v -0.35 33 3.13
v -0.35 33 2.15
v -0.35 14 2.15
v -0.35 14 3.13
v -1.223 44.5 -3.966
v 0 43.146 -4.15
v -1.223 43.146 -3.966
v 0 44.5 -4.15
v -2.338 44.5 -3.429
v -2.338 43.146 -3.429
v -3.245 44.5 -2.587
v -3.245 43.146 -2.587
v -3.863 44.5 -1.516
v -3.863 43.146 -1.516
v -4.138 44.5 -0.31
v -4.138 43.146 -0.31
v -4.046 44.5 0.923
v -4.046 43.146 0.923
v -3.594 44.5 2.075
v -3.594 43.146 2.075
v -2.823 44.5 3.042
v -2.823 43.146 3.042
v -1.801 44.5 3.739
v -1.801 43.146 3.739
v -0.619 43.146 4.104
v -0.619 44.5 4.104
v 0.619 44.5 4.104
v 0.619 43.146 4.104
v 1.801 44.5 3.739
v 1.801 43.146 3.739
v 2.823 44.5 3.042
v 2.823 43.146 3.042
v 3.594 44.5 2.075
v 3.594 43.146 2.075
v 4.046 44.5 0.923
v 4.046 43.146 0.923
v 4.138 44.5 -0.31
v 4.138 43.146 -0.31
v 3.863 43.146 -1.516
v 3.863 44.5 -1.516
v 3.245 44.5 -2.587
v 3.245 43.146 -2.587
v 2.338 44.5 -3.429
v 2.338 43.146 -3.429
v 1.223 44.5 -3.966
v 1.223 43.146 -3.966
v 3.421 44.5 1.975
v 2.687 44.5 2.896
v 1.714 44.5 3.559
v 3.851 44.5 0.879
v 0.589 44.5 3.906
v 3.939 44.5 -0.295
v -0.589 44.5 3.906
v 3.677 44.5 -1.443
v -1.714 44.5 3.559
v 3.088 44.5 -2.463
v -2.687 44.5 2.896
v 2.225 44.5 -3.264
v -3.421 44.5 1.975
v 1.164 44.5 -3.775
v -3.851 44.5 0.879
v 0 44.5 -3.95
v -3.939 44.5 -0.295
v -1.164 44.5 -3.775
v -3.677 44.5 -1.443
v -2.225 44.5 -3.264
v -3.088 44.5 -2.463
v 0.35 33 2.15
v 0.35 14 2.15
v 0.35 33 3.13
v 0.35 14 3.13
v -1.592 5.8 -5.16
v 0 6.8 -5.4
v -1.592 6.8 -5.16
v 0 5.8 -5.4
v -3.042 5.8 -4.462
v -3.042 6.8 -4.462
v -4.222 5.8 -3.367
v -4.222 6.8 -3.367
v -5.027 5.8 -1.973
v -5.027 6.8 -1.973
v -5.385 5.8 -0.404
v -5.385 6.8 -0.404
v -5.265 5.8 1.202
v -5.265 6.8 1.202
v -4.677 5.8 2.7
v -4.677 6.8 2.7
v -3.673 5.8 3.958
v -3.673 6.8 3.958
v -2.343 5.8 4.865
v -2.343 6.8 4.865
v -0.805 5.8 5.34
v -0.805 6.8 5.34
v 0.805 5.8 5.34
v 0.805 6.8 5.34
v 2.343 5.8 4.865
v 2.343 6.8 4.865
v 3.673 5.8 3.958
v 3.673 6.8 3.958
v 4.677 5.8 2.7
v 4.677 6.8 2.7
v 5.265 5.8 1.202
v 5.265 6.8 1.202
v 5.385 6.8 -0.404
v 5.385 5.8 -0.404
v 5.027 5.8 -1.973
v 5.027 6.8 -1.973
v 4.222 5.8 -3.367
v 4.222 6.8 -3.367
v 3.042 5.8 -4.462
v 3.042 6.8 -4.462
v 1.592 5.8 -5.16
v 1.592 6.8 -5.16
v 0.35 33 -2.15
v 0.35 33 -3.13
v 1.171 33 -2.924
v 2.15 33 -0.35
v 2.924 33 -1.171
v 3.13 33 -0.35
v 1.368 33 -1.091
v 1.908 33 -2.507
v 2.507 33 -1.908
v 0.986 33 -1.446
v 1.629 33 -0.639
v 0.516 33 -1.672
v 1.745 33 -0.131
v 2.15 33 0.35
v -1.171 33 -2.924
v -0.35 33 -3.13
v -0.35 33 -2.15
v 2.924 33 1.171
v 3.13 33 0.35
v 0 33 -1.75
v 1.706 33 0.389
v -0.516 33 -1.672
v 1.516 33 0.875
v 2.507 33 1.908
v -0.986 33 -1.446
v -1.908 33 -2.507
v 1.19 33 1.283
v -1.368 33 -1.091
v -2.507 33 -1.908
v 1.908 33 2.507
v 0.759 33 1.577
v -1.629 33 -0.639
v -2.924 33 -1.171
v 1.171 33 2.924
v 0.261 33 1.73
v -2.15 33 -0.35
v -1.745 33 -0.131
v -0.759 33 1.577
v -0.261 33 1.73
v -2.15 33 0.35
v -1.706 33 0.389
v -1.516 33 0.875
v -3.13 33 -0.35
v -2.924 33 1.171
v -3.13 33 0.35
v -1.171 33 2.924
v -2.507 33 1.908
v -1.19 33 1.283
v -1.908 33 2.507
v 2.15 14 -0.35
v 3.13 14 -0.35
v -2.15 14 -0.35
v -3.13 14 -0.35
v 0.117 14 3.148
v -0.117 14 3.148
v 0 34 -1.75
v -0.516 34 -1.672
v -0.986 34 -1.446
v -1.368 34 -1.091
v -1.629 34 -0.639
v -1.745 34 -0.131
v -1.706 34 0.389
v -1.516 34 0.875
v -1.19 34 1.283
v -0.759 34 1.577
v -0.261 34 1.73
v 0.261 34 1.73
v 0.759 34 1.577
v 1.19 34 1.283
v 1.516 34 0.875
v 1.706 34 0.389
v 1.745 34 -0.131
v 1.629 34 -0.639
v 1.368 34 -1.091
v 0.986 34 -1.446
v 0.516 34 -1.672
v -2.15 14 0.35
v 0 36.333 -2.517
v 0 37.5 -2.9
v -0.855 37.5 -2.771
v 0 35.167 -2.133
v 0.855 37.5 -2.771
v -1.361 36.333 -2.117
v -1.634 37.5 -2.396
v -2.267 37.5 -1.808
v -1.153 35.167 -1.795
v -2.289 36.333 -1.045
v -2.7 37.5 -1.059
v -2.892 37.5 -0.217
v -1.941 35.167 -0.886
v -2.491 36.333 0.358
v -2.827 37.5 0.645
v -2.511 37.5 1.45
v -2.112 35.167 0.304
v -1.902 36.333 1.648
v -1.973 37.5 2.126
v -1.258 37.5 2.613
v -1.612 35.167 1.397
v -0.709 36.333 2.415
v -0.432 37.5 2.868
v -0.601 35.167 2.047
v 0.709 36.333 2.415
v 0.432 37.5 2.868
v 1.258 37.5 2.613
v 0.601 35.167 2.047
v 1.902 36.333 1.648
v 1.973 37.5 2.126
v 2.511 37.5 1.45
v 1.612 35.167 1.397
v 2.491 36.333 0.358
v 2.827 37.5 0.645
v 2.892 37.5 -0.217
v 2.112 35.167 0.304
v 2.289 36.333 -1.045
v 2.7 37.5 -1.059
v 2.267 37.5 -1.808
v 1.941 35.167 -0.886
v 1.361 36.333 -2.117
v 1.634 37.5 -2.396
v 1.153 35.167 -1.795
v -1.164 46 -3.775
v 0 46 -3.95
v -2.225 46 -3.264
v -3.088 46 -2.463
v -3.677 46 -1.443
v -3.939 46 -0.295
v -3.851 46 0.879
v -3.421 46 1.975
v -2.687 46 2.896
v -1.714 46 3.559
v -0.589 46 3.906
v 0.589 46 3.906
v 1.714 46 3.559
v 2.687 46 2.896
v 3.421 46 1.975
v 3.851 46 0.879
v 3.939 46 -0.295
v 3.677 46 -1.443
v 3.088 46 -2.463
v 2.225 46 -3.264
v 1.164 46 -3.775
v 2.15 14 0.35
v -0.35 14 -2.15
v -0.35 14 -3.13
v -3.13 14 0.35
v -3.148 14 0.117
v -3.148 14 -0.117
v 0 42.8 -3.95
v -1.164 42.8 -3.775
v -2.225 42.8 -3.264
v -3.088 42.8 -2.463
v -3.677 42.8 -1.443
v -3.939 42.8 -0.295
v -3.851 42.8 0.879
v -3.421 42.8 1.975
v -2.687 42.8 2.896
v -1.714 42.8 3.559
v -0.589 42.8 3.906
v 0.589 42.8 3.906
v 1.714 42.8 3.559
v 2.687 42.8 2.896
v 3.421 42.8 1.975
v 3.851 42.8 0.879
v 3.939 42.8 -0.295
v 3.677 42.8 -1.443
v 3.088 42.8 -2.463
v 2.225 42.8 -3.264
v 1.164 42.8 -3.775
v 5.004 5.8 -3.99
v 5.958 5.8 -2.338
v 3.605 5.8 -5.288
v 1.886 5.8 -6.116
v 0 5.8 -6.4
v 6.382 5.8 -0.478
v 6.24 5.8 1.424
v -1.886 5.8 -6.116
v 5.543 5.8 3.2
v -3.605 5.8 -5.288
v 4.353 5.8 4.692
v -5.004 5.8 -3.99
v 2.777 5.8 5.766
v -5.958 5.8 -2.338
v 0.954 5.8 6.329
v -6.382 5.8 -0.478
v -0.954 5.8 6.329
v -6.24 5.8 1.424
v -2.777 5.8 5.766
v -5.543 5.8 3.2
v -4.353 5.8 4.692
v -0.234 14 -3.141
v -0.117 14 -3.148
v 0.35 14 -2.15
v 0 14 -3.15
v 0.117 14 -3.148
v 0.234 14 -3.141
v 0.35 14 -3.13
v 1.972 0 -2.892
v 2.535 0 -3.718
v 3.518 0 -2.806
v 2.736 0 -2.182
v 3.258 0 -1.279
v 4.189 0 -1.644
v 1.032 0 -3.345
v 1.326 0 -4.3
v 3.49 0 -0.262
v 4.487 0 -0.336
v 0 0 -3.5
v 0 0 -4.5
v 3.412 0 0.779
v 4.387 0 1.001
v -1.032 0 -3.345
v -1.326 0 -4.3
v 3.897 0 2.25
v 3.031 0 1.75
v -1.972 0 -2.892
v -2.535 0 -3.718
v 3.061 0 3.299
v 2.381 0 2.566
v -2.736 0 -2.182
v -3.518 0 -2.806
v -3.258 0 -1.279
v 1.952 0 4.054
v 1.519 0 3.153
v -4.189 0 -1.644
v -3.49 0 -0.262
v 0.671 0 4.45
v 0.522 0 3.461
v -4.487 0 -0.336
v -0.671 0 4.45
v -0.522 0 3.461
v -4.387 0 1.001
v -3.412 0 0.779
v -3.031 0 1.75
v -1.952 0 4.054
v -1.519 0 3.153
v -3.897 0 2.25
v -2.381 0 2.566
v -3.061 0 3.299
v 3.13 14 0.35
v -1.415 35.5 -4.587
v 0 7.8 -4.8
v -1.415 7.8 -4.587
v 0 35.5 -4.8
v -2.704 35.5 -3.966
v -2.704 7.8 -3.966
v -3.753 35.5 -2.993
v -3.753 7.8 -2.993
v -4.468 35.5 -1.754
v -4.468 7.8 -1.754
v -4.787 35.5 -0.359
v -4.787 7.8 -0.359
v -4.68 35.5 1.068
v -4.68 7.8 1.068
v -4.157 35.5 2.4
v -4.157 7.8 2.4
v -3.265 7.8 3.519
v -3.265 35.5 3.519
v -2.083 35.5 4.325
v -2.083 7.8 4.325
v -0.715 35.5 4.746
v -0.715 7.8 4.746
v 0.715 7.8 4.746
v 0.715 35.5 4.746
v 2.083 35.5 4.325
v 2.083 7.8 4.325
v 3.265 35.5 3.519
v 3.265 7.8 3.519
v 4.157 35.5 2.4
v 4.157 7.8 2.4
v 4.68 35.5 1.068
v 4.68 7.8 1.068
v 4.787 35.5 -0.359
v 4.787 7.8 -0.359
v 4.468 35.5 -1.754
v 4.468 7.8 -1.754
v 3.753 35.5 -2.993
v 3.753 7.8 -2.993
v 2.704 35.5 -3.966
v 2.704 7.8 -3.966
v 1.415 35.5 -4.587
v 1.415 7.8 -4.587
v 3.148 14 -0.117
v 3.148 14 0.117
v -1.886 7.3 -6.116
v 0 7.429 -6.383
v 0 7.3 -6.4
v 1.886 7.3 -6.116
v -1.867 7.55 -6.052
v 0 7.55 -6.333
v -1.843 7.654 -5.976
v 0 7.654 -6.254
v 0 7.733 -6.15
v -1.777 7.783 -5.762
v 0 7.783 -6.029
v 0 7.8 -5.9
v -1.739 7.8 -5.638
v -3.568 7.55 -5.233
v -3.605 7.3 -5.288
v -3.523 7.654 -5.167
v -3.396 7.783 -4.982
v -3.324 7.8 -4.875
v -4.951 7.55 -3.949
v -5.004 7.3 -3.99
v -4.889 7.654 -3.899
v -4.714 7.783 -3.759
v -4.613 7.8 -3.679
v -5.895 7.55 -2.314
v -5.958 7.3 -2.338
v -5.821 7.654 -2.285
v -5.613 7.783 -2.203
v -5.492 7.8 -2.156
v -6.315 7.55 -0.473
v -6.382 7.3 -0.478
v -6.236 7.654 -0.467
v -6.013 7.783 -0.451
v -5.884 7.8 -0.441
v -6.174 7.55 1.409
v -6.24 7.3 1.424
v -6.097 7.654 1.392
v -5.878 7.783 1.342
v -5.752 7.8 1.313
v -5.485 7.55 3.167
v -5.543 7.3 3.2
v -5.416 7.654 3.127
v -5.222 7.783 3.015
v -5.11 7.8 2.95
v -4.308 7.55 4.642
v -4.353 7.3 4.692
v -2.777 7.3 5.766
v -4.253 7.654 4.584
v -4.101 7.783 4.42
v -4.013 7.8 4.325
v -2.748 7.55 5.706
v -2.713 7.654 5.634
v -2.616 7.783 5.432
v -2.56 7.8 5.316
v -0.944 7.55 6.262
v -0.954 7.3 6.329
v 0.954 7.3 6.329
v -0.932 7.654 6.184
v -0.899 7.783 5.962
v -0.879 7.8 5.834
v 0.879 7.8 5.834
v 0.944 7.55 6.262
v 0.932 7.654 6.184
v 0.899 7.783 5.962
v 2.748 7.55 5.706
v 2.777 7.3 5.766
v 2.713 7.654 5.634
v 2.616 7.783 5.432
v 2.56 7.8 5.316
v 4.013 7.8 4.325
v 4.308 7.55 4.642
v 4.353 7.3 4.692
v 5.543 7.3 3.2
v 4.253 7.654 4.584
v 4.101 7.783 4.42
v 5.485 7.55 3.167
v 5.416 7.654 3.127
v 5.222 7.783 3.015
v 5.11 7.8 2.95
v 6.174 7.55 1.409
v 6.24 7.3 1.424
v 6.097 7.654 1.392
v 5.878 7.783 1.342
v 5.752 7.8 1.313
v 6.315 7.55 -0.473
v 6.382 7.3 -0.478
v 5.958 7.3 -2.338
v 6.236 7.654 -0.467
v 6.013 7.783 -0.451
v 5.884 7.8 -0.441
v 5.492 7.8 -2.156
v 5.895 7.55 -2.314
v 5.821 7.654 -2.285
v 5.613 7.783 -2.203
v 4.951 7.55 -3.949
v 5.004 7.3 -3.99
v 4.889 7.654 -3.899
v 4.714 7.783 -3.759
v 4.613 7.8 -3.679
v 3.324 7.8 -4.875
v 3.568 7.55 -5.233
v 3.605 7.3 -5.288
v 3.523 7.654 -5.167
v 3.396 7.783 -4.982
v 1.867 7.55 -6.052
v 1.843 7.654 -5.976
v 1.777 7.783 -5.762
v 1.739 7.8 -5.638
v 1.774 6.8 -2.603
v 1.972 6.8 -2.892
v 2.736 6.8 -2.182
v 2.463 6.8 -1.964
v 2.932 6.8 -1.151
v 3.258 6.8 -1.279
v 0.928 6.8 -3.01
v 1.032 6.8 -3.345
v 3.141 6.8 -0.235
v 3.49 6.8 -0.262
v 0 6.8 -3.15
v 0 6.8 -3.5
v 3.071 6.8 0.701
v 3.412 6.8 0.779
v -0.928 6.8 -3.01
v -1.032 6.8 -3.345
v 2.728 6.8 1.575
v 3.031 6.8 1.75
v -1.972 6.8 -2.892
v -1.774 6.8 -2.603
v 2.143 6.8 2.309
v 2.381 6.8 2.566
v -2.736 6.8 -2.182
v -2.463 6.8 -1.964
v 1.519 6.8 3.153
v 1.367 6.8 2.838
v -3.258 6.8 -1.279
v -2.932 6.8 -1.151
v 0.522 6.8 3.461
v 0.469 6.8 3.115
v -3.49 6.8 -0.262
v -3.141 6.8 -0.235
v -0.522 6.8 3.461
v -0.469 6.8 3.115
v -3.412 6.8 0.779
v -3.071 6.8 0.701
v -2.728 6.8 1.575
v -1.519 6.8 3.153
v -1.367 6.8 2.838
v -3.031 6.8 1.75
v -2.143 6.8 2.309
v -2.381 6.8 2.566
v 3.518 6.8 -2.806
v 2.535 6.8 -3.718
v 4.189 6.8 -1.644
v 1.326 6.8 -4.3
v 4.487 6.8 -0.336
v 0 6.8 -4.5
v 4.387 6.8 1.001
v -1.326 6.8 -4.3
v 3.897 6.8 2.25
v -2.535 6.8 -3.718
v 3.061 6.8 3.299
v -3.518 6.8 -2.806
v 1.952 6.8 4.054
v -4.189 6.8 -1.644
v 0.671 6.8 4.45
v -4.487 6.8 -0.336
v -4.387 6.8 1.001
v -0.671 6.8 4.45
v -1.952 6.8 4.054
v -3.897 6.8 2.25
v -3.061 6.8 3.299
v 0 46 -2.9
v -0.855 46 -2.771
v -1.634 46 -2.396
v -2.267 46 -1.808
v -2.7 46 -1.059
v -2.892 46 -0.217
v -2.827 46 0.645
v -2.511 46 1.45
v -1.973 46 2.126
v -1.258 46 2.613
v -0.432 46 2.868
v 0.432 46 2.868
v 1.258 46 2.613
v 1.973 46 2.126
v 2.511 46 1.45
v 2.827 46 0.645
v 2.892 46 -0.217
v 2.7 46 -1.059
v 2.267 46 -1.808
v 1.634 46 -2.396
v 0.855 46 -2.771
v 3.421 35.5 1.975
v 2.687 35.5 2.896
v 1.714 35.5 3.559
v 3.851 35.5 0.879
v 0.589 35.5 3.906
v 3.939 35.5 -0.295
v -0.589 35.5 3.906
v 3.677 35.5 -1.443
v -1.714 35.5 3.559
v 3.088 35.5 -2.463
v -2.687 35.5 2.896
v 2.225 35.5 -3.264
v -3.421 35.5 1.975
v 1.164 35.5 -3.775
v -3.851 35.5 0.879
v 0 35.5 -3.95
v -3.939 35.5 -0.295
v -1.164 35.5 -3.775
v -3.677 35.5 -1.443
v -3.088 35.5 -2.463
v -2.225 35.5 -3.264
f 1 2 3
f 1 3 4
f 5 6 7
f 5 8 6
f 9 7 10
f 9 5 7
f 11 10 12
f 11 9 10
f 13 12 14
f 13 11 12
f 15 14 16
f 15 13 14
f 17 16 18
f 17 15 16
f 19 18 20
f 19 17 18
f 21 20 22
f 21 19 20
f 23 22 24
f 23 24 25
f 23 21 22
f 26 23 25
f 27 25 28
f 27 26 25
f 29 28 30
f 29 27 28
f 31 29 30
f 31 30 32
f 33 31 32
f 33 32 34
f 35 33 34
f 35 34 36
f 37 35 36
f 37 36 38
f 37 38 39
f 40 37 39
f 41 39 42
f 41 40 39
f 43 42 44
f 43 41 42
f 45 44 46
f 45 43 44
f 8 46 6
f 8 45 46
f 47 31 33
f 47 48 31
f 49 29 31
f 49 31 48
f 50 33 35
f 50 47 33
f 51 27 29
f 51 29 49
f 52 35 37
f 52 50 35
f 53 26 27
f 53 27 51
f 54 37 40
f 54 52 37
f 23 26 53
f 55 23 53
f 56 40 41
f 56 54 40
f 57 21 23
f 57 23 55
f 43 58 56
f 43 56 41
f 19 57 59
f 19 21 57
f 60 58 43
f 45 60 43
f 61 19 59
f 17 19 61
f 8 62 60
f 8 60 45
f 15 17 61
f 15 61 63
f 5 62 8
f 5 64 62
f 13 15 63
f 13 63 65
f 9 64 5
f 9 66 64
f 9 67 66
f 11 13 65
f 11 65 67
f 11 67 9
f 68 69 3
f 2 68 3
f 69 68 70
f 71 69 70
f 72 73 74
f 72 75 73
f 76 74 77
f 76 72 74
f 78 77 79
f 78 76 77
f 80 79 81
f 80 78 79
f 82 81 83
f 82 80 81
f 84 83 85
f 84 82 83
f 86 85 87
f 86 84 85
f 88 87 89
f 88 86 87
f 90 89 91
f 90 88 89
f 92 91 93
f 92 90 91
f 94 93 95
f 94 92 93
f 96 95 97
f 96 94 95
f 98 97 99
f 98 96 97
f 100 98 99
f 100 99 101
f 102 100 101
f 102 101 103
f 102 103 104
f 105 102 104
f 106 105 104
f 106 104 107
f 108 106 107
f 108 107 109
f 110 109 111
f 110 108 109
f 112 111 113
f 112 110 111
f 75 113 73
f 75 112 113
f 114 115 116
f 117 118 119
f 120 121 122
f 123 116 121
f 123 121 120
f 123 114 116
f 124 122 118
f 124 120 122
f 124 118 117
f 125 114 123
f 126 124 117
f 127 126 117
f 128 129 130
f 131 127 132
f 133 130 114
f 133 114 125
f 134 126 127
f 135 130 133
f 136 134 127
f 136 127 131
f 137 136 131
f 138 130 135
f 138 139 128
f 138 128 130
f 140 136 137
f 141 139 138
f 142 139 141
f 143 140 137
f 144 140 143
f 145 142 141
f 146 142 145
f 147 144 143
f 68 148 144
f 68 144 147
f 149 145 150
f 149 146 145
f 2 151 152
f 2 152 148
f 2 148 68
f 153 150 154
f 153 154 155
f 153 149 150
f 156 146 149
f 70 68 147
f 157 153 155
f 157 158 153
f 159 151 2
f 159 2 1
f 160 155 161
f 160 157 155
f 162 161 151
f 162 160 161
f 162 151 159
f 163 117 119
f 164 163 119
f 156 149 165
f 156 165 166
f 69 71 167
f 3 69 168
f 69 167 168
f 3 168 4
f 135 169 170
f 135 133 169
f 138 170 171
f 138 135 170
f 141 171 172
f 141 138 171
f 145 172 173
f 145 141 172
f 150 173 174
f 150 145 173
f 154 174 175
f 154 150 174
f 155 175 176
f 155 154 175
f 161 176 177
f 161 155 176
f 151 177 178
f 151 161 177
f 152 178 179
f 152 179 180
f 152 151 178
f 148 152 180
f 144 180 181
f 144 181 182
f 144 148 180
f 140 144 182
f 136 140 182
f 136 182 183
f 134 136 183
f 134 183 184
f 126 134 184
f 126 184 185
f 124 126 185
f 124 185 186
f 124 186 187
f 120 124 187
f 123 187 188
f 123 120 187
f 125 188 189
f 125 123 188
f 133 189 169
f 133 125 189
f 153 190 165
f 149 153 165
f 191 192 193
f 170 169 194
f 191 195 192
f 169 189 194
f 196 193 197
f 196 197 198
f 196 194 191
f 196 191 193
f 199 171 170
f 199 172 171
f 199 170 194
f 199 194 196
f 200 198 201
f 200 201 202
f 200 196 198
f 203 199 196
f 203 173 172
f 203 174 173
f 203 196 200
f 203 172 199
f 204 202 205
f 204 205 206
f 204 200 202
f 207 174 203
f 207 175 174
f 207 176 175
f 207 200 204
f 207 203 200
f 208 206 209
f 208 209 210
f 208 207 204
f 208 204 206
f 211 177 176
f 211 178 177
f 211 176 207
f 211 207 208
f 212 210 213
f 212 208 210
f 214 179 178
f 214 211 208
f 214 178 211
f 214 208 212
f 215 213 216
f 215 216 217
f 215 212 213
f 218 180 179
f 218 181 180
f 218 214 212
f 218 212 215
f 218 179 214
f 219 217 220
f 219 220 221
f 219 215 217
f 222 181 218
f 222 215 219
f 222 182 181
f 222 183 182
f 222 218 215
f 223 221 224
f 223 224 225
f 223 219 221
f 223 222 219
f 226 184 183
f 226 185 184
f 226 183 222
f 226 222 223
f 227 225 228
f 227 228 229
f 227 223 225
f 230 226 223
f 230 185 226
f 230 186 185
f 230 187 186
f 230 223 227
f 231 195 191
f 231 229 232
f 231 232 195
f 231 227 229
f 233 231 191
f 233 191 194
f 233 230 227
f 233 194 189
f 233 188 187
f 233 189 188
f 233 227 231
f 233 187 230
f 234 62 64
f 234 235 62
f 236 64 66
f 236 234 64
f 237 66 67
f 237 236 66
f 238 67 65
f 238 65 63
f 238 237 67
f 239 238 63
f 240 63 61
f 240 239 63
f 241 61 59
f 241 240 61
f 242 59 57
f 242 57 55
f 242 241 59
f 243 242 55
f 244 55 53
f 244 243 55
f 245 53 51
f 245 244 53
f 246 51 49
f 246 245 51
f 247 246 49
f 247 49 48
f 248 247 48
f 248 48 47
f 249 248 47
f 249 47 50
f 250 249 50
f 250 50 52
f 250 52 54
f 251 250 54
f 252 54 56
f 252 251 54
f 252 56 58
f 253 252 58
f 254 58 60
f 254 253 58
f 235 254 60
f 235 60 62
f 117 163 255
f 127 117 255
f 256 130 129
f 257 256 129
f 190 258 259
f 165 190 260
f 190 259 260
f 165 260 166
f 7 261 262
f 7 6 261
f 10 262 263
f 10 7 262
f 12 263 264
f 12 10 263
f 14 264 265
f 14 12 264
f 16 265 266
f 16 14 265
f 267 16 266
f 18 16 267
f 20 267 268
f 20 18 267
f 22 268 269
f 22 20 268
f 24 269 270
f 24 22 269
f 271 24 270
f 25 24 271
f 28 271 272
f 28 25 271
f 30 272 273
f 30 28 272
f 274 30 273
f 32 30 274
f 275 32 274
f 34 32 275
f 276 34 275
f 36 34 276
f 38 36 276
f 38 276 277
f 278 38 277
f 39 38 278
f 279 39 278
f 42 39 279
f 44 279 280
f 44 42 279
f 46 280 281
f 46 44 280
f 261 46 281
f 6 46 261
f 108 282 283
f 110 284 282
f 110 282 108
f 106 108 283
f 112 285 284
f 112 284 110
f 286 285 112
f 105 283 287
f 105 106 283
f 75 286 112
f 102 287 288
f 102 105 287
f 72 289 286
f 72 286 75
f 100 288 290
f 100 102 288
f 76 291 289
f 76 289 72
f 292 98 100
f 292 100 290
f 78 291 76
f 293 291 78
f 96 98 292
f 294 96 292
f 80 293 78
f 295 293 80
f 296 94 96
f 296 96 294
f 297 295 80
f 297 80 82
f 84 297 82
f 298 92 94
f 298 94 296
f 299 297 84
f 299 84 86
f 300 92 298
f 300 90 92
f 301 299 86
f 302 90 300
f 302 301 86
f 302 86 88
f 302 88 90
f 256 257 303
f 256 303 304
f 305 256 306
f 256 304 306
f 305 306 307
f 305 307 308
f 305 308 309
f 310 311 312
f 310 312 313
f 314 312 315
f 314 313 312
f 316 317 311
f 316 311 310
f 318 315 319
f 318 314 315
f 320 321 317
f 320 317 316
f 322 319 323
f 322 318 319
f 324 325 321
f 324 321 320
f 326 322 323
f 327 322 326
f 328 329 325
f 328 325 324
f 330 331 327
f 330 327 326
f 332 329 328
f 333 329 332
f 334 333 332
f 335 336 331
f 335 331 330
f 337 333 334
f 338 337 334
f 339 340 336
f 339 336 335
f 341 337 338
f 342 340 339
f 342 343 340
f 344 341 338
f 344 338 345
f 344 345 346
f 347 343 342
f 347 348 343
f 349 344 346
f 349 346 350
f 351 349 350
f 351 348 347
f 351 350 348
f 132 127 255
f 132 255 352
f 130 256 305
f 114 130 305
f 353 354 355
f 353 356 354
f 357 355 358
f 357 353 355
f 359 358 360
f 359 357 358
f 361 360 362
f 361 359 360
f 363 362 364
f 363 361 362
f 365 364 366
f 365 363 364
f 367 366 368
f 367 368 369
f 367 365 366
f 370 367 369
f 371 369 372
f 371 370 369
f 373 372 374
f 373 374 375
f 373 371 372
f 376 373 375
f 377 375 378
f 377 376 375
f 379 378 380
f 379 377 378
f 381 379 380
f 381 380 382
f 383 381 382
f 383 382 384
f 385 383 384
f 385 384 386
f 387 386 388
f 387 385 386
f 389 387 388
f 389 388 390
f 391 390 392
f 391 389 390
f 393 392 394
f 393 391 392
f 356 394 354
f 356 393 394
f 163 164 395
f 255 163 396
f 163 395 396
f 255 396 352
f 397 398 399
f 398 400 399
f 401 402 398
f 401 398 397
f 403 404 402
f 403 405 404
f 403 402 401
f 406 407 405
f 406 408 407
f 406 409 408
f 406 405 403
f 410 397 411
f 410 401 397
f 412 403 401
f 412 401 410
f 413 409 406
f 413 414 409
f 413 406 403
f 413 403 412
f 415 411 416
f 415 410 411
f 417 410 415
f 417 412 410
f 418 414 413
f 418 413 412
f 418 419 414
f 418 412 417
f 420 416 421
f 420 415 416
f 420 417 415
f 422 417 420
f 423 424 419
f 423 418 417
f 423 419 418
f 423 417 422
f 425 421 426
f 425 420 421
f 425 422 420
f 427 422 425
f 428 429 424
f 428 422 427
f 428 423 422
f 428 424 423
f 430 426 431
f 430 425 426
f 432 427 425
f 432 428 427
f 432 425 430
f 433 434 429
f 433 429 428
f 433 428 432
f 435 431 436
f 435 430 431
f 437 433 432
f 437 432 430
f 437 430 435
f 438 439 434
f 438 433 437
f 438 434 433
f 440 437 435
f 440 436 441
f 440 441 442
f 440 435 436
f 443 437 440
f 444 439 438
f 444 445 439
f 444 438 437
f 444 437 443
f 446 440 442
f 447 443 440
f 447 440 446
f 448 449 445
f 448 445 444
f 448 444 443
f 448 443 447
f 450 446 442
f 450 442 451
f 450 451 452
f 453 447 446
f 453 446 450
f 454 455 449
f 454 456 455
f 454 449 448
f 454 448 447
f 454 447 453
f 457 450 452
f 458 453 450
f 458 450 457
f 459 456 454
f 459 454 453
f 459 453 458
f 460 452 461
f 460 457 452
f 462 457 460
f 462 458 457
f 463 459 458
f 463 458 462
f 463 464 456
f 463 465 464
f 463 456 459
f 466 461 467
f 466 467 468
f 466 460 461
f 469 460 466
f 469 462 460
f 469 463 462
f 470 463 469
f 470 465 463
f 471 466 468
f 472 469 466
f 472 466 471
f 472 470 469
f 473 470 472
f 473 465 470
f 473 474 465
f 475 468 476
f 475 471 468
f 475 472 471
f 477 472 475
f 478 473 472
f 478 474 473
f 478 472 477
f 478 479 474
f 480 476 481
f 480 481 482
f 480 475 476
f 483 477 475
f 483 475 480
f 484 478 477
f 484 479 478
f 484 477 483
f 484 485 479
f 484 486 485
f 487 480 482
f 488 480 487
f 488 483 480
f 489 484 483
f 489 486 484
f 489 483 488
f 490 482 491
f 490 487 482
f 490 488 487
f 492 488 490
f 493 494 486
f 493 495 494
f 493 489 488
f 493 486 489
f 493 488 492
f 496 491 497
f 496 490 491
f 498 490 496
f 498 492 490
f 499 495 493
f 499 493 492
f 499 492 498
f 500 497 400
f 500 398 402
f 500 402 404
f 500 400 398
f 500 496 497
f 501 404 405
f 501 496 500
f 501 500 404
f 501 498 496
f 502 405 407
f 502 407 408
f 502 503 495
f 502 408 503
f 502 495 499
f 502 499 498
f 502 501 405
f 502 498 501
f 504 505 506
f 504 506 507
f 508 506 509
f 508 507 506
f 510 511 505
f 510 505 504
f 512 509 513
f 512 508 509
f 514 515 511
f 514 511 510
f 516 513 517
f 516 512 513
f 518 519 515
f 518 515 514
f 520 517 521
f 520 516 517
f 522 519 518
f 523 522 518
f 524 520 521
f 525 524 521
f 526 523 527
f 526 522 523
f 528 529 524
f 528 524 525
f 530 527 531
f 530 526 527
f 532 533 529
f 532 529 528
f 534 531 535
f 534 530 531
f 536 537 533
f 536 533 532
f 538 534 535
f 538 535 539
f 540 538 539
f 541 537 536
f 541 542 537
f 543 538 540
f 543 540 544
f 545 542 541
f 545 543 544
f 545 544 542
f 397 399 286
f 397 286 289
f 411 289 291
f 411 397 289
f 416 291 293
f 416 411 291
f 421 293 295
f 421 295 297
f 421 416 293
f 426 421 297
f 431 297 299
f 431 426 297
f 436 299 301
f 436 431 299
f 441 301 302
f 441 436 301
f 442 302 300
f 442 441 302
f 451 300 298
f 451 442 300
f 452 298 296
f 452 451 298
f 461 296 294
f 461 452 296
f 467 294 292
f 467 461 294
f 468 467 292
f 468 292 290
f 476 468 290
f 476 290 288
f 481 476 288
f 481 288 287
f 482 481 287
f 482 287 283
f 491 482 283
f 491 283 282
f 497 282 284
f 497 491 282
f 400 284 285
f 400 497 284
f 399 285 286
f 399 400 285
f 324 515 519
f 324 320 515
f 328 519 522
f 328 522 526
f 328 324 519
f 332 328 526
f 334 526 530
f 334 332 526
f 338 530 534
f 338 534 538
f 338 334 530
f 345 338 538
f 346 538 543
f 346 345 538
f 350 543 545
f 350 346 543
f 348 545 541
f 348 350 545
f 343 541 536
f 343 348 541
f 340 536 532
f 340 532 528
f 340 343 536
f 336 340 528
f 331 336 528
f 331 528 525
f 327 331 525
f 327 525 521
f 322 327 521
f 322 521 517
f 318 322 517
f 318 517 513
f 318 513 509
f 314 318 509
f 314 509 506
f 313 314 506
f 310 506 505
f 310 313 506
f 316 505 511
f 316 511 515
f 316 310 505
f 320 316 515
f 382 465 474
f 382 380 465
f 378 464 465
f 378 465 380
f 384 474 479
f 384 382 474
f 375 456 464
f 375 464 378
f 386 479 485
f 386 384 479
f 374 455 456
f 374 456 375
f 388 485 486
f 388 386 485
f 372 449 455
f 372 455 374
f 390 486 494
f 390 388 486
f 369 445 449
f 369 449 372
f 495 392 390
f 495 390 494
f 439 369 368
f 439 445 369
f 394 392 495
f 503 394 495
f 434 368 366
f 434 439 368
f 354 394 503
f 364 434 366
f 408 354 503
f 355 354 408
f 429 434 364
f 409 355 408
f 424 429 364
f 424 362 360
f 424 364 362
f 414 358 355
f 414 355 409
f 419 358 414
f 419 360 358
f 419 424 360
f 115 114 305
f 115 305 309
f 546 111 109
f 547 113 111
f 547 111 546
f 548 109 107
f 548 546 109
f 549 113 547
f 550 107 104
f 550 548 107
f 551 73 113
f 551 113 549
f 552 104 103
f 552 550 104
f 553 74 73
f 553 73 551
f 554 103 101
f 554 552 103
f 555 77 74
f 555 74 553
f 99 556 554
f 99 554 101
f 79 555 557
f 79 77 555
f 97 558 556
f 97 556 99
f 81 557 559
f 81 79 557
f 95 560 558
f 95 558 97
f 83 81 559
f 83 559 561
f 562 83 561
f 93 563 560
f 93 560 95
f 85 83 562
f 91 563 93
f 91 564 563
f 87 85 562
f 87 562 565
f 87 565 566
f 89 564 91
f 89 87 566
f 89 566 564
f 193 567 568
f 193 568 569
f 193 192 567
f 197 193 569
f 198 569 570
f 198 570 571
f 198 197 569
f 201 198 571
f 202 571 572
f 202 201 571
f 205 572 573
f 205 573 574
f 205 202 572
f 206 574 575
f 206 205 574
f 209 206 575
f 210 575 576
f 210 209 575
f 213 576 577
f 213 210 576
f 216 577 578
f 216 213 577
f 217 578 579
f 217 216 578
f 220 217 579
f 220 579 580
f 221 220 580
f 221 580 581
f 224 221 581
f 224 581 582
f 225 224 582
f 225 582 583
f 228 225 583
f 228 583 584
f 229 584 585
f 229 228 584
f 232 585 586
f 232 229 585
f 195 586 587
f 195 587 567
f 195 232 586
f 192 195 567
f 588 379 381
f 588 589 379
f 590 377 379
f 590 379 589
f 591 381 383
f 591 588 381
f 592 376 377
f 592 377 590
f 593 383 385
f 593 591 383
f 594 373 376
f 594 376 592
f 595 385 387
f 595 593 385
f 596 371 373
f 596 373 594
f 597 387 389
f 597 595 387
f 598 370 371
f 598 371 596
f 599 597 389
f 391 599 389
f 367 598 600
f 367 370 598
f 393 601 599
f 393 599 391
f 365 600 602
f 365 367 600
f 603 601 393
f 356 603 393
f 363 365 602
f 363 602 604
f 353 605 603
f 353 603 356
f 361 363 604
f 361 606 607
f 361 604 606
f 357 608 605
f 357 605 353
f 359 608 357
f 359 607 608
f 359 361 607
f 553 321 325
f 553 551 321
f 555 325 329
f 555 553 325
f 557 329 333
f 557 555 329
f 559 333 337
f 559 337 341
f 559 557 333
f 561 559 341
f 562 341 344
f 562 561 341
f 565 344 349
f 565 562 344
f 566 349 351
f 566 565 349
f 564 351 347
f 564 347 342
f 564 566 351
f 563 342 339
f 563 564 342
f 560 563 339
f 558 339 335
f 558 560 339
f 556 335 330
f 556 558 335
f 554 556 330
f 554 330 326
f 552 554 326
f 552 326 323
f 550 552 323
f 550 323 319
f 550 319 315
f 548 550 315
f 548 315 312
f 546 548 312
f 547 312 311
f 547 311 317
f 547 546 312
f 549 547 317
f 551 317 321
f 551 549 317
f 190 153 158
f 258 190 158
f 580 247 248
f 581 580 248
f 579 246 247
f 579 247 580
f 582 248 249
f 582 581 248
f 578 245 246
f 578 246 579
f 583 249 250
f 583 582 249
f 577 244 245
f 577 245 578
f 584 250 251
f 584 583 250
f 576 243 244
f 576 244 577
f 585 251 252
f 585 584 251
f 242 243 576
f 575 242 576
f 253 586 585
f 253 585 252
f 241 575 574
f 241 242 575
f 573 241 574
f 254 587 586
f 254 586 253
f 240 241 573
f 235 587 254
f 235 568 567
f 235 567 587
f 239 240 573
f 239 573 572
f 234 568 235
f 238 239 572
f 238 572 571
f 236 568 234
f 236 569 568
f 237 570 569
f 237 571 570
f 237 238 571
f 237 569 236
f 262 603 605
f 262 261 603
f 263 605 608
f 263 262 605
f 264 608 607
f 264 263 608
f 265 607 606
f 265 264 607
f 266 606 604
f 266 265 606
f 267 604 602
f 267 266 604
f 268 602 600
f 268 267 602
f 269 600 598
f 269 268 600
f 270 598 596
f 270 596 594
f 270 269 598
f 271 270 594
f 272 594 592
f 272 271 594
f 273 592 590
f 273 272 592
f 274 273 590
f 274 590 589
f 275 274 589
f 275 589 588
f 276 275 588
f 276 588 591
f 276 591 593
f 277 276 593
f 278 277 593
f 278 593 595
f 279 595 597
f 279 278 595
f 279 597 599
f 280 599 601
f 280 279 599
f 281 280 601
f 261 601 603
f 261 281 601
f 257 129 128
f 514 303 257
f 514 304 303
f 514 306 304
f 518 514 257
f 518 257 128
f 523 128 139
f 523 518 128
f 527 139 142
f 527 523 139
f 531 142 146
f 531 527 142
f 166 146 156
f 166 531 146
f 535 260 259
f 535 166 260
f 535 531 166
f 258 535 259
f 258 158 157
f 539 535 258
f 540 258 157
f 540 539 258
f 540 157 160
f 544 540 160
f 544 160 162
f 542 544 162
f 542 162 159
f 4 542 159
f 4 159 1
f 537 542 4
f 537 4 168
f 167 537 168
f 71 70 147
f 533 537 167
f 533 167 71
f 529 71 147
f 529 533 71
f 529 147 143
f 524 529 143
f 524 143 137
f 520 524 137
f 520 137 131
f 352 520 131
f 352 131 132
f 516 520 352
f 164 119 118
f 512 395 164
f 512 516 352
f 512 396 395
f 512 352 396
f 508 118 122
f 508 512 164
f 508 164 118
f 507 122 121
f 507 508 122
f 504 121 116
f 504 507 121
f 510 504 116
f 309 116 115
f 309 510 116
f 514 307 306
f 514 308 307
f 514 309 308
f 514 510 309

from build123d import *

# Parameters (mm, degrees)
FILLET1_R           = 0.5
BOSS_EXTRUDE1_REACH = 62.882
BOSS_EXTRUDE1_START = 14
SKETCH2_W           = 0.7
SKETCH2_H           = 1
CIRPATTERN1_COUNT   = 4


with BuildPart() as part:
    # Sketch1 → Revolve1 (revolve)
    with BuildSketch(Plane(origin=(0, 0, 0), x_dir=(0, 0, -1), z_dir=(1, 0, 0))):
        Polygon((3.15, 33), (3.15, 6.8), (3.5, 6.8), (3.5, 0), (4.5, 0), (4.5, 6.8), (5.4, 6.8), (5.4, 5.8), (6.4, 5.8), (6.4, 7.8), (4.8, 7.8), (4.8, 35.5), (3.95, 35.5), (3.95, 42.8), (4.15, 43.146410162), (4.15, 44.5), (3.95, 44.5), (3.95, 46), (2.9, 46), (2.9, 37.5), (1.75, 34), (1.75, 33), align=None)
    revolve(axis=Axis((0, 0, 0), (0, 1, 0)))

    # Fillet1
    fillet1_edges = [part.edges().sort_by_distance(p)[0] for p in [
        (0, 7.8, 6.4),
    ]]
    fillet(fillet1_edges, radius=FILLET1_R)

    # Sketch2 → Boss-Extrude1 (add, up to next)
    with BuildSketch(Plane(origin=(0, 0, 0), x_dir=(-1, 0, 0), z_dir=(0, 1, 0)).offset(BOSS_EXTRUDE1_START), mode=Mode.PRIVATE) as boss_extrude1_sk1:
        with Locations((0, 2.65)):
            Rectangle(SKETCH2_W, SKETCH2_H)
    boss_extrude1_tool1 = extrude(boss_extrude1_sk1.sketch, amount=BOSS_EXTRUDE1_REACH, mode=Mode.PRIVATE) - part.part
    boss_extrude1 = boss_extrude1_tool1.solids().sort_by_distance((0, 14, 2.65))[0]
    add(boss_extrude1)

    # CirPattern1: Boss-Extrude1 ×4 about axis
    cirpattern1_axis = Axis((0, 0, 0), (0, 1, 0))
    for i in range(1, CIRPATTERN1_COUNT):
        add(boss_extrude1.rotate(cirpattern1_axis, i * 360 / CIRPATTERN1_COUNT))


solid = part.part
